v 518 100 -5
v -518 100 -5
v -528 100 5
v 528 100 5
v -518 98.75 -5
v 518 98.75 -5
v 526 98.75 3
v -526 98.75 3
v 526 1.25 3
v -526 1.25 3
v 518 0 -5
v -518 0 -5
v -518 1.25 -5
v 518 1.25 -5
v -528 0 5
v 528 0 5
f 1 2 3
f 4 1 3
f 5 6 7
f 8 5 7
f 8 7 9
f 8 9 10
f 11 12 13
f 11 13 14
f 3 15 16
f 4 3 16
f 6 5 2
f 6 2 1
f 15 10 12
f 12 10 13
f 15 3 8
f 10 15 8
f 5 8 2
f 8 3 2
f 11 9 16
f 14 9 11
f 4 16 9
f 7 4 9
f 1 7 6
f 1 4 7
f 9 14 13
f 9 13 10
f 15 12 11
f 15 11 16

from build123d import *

# Parameters (mm, degrees)
CROQUIS1_W              = 1056
CROQUIS1_H              = 10
SALIENTE_EXTRUIR1_DEPTH = 100
CORTAR_EXTRUIR1_DEPTH   = 100
CROQUIS3_W              = 1056
CROQUIS3_H              = 97.5
CORTAR_EXTRUIR2_DEPTH   = 8


with BuildPart() as part:
    # Croquis1 → Saliente-Extruir1 (new body)
    with BuildSketch(Plane(origin=(0, 0, 0), x_dir=(1, 0, 0), z_dir=(0, 1, 0))):
        Rectangle(CROQUIS1_W, CROQUIS1_H)
    extrude(amount=SALIENTE_EXTRUIR1_DEPTH)

    # Croquis2 → Cortar-Extruir1 (cut)
    with BuildSketch(Plane(origin=(0, 100, 0), x_dir=(1, 0, 0), z_dir=(0, 1, 0))):
        Polygon((-528, -5), (-518, 5), (-528, 5), align=None)
        Polygon((518, 5), (528, 5), (528, -5), align=None)
    extrude(amount=-CORTAR_EXTRUIR1_DEPTH, mode=Mode.SUBTRACT)

    # Croquis3 → Cortar-Extruir2 (cut)
    with BuildSketch(Plane(origin=(0, 0, -5), x_dir=(-1, 0, 0), z_dir=(0, 0, -1))):
        with Locations((0, 50)):
            Rectangle(CROQUIS3_W, CROQUIS3_H)
    extrude(amount=-CORTAR_EXTRUIR2_DEPTH, mode=Mode.SUBTRACT)


solid = part.part
